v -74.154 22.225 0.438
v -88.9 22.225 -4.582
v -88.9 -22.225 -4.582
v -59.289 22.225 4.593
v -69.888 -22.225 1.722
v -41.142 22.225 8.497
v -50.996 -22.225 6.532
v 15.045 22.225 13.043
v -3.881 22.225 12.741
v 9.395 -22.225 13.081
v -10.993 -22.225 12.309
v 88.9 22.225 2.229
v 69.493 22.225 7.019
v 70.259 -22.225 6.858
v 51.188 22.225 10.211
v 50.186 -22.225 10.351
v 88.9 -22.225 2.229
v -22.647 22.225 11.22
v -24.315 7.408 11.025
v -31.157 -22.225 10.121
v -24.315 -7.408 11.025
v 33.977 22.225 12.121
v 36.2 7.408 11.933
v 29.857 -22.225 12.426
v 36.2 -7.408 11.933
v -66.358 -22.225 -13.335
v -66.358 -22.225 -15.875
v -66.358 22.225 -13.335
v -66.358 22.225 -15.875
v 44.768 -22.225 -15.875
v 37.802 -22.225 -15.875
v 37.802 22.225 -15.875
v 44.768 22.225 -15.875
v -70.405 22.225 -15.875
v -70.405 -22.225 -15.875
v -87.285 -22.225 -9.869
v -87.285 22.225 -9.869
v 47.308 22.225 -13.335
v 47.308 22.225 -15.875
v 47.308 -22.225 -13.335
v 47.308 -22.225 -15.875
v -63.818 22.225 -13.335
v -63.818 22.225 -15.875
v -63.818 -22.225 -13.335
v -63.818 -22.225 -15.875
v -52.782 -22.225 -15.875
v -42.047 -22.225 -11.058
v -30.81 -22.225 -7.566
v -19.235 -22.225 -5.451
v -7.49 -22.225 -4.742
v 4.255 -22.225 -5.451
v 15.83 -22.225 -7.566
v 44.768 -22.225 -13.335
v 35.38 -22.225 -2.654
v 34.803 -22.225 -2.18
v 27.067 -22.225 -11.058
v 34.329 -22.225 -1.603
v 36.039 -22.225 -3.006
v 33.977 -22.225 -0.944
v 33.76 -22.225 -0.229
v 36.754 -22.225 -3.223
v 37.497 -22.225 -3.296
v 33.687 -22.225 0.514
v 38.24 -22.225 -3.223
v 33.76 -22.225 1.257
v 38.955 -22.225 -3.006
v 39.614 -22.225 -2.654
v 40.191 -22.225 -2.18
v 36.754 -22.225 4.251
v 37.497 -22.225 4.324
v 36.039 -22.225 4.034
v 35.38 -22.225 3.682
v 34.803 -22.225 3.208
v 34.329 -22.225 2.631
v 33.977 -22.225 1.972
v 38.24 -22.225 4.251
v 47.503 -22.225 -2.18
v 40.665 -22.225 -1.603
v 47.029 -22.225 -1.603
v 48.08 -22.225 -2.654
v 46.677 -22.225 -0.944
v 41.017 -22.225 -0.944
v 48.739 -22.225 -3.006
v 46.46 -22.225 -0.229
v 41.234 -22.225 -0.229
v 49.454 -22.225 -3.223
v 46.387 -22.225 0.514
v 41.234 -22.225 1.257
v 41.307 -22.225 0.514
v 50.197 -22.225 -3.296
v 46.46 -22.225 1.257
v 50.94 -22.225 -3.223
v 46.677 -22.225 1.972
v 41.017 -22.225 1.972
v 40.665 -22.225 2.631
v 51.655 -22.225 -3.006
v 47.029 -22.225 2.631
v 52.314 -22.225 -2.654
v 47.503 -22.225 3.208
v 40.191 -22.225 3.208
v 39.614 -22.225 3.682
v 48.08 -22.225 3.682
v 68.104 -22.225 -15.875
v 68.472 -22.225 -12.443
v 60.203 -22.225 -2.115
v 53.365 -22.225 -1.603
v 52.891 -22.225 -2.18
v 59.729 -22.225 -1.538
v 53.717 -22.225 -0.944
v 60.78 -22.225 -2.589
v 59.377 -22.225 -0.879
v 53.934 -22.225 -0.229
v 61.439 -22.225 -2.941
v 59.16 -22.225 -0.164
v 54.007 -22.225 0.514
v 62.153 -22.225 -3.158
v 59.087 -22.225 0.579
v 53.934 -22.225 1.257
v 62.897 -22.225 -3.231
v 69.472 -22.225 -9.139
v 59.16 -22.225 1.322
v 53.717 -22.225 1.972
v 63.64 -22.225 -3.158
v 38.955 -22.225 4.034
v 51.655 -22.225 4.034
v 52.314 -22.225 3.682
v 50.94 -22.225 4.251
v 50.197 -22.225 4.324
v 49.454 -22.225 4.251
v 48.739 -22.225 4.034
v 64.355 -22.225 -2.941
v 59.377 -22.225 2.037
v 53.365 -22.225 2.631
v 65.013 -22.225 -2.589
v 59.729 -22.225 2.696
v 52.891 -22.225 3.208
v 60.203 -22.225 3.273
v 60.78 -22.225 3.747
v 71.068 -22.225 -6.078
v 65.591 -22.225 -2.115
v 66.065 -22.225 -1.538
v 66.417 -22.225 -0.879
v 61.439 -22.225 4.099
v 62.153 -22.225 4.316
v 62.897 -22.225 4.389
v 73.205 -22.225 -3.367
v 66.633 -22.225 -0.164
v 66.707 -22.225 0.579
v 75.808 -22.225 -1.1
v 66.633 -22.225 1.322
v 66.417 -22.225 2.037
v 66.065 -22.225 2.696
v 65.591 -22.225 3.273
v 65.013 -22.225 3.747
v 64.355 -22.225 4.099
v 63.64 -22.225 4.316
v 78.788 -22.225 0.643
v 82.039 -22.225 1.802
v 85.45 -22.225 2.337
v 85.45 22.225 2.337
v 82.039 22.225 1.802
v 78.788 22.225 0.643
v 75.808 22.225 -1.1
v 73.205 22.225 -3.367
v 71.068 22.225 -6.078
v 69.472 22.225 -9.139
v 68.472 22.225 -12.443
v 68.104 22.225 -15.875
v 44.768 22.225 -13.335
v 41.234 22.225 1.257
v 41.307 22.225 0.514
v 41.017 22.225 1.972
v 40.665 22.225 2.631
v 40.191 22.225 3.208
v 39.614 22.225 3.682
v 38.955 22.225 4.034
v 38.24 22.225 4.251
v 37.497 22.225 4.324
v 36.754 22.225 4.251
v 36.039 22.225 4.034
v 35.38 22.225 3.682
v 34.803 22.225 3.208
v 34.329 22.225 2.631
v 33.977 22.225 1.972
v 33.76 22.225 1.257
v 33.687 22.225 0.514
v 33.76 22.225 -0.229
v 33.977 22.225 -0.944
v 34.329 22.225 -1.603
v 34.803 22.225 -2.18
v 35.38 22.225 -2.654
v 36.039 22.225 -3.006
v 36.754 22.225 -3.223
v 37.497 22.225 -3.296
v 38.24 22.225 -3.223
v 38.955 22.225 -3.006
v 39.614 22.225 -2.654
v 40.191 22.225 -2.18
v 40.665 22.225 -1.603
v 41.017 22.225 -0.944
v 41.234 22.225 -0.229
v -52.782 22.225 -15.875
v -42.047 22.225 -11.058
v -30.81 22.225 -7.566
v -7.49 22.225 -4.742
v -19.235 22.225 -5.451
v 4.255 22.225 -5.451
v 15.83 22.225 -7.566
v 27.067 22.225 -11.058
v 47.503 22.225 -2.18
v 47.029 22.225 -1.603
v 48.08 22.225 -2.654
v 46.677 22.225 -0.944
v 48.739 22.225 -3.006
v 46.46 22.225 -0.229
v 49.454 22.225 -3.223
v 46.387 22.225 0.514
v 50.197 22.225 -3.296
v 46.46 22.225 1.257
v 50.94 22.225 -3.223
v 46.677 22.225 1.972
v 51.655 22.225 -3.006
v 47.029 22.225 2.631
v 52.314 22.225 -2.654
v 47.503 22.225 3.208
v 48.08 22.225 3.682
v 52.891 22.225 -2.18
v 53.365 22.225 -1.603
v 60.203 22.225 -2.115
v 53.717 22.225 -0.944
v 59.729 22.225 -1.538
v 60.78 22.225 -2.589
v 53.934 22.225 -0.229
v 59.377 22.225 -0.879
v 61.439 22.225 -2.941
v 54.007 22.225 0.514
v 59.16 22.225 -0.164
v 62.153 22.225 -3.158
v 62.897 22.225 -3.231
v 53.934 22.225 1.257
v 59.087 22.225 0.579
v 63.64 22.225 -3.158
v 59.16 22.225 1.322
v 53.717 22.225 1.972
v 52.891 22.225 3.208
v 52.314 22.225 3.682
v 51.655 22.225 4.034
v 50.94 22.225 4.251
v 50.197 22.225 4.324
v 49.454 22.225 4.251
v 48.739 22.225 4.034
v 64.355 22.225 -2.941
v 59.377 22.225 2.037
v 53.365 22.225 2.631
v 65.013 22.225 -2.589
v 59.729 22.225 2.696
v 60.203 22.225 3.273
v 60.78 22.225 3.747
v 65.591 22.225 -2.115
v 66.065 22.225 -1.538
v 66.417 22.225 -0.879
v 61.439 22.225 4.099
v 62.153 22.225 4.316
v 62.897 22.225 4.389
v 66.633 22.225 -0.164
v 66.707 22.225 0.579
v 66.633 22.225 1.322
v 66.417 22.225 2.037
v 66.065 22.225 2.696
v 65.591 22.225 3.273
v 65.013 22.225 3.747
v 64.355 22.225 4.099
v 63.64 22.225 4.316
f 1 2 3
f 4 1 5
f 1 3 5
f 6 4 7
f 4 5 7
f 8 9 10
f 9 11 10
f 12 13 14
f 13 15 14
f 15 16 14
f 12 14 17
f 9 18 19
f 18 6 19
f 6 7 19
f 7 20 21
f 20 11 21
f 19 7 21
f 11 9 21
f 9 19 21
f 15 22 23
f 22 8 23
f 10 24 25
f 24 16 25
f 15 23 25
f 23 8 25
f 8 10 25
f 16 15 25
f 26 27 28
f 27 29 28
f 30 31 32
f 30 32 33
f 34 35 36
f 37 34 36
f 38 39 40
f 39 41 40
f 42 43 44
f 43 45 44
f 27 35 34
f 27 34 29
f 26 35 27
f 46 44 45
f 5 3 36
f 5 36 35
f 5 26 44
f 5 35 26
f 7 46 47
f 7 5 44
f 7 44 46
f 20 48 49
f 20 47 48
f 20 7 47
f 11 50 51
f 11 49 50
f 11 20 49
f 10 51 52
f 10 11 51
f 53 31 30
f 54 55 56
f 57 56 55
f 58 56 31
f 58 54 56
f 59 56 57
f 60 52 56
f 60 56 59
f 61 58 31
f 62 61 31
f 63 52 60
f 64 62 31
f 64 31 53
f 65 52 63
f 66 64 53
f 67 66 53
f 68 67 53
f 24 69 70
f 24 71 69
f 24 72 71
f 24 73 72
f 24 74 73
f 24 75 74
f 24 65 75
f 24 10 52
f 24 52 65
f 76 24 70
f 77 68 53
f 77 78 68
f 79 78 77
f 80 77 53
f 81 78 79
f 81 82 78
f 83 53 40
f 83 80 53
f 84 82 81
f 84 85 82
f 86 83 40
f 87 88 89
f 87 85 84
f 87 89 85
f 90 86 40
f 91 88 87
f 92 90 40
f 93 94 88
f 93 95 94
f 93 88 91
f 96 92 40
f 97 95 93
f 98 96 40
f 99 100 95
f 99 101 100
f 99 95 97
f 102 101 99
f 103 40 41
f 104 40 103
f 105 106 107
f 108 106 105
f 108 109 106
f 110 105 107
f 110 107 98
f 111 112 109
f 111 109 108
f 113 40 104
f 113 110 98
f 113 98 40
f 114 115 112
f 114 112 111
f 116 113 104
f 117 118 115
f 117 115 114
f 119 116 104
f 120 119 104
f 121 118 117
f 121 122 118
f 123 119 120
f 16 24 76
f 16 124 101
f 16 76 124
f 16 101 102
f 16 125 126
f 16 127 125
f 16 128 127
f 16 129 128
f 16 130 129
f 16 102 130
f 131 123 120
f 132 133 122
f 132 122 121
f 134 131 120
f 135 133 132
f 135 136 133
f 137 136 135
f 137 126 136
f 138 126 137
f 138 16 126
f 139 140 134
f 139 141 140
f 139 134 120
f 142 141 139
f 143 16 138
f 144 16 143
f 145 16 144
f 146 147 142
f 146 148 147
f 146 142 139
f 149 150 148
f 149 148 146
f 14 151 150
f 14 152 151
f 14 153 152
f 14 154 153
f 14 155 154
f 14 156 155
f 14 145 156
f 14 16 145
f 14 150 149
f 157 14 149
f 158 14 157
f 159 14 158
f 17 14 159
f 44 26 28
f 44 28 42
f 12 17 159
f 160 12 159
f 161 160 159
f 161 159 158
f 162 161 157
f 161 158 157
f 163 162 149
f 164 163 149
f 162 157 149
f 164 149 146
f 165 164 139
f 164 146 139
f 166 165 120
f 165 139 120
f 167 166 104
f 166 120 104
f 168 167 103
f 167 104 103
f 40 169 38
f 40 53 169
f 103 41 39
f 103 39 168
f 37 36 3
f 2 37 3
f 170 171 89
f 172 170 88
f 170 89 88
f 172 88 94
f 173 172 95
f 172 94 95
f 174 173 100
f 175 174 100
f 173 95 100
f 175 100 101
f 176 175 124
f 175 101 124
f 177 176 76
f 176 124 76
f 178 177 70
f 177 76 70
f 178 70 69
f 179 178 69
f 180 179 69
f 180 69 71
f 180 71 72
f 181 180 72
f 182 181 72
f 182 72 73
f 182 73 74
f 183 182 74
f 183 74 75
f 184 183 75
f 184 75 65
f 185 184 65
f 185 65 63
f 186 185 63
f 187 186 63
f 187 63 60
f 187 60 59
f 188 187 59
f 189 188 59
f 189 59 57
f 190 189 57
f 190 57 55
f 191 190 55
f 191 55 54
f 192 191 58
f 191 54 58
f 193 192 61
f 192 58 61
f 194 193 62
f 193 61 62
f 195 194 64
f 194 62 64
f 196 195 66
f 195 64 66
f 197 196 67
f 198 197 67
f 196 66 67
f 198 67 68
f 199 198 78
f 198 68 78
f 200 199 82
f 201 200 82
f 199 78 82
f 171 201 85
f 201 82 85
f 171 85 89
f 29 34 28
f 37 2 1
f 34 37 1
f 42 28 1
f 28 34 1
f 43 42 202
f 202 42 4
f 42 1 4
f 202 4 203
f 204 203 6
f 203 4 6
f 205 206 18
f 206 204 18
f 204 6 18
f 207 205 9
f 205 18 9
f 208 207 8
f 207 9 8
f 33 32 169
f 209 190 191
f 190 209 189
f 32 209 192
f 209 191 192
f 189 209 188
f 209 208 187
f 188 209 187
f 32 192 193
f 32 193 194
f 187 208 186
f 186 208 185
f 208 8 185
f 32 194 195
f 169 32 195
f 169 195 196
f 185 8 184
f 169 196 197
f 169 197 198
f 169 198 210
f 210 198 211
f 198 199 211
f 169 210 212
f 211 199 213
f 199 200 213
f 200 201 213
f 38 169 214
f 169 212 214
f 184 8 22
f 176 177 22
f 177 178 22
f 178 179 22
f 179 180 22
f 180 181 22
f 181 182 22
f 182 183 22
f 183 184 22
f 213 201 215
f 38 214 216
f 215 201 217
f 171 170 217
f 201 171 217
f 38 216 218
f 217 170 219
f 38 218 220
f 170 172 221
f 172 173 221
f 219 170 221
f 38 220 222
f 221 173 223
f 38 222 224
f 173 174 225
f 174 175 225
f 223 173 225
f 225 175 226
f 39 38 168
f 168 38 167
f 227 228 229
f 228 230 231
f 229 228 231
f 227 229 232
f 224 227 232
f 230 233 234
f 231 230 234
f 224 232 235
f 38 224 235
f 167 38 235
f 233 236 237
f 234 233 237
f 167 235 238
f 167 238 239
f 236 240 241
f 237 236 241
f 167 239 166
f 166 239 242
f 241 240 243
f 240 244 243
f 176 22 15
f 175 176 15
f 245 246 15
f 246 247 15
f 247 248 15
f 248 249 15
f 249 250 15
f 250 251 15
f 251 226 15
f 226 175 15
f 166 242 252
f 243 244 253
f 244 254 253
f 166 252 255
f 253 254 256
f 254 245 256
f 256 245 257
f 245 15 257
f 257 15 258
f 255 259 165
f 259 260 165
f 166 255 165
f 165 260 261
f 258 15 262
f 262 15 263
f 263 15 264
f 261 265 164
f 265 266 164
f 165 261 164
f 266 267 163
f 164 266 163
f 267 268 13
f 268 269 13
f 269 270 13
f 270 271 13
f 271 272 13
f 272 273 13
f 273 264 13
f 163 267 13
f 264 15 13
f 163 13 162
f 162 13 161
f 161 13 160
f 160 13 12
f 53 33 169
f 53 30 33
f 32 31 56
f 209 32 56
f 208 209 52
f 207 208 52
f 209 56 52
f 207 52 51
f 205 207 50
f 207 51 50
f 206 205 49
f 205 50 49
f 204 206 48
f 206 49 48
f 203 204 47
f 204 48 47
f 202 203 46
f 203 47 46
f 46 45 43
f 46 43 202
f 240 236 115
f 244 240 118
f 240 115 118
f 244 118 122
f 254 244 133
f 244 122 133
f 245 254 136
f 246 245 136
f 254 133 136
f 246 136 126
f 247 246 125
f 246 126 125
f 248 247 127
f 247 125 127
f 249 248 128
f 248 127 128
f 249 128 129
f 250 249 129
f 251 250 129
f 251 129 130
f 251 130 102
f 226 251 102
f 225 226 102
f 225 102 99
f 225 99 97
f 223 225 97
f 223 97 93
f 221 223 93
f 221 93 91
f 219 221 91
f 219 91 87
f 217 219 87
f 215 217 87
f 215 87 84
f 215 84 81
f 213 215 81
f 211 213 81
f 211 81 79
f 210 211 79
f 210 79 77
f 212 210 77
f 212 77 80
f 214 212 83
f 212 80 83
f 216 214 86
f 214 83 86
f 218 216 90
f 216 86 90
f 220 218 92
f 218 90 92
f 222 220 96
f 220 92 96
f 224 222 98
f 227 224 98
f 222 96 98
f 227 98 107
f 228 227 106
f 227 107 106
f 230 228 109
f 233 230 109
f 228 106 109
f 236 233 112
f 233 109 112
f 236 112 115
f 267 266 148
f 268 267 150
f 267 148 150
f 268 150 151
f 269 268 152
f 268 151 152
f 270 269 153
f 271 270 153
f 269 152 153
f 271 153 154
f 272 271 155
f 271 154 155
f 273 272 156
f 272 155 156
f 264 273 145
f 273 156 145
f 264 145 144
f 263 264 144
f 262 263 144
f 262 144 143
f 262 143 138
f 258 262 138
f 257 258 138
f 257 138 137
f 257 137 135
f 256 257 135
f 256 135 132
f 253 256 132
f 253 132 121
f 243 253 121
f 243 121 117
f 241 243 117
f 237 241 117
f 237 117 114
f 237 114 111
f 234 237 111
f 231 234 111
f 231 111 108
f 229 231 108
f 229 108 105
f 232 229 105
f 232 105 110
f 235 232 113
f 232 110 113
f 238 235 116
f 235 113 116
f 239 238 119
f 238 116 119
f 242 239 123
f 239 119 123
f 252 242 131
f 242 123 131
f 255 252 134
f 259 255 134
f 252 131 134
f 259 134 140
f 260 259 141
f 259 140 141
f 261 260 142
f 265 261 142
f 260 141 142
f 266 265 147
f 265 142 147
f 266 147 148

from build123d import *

# Parameters (mm, degrees)
F0_W          = 177.8
F0_H          = 31.75
F5_DEPTH      = 22.225
F1_W          = 2.54
F1_H          = 2.54
F2_DEPTH      = 22.225
F2_DEPTH_BACK = 22.225
F3_R          = 3.81
F4_DEPTH      = 101.6


with BuildPart() as f5:
    # F0 (on Front) → F5 (new body, symmetric)
    with BuildSketch(Plane.XZ):
        Rectangle(F0_W, F0_H)
    extrude(amount=F5_DEPTH, both=True)

    # F1 (on Front) → F2 (cut, two sides)
    with BuildSketch(Plane.XZ) as f2_sk:
        with Locations((-65.0875, -14.605)):
            Rectangle(F1_W, F1_H)
        with Locations((46.0375, -14.605)):
            Rectangle(F1_W, F1_H)
    extrude(amount=F2_DEPTH, mode=Mode.SUBTRACT)
    extrude(f2_sk.sketch, amount=-F2_DEPTH_BACK, mode=Mode.SUBTRACT)

    # F3 (on face) → F4 (cut)
    with BuildSketch(Plane.XZ.offset(22.225)):
        with BuildLine():
            Line((-87.2850343585, -9.8690753803), (-88.9, -4.5820707456))
            add(Edge.make_bspline(
                [(-88.9, -4.5820707456), (-23.5271696001, 19.7381507605), (41.3550932653, 15.875), (88.9, 2.2290744901)],
                knots=[0, 0, 0, 0, 177.9304125197, 177.9304125197, 177.9304125197, 177.9304125197], degree=3))
            ThreePointArc((88.9, 2.2290744901), (74.4536678544, -2.1727649281), (68.10375, -15.875))
            Line((68.10375, -15.875), (90.8870175481, -24.3202205747))
            Line((90.8870175481, -24.3202205747), (97.0551893115, -13.2175106555))
            Line((97.0551893115, -13.2175106555), (95.2541902661, 10.2215418592))
            Line((95.2541902661, 10.2215418592), (84.6801921725, 31.5457955003))
            Line((84.6801921725, 31.5457955003), (-24.4083367288, 31.5457955003))
            Line((-24.4083367288, 31.5457955003), (-91.2008285522, 31.5457955003))
            Line((-91.2008285522, 31.5457955003), (-99.3075743318, -4.2296038009))
            Line((-99.3075743318, -4.2296038009), (-93.3156237006, -24.4964528829))
            Line((-93.3156237006, -24.4964528829), (-70.4052746296, -15.875))
            Line((-70.4052746296, -15.875), (-87.2850343585, -9.8690753803))
        make_face()
        with Locations((37.4968686472, 0.5141830338)):
            Circle(F3_R)
        with Locations((50.1968686472, 0.5141830338)):
            Circle(F3_R)
        with Locations((62.8967040475, 0.578842176)):
            Circle(F3_R)
        with BuildLine():
            Line((-8.0186231062, -30.1359239966), (37.8020815551, -15.875))
            ThreePointArc((37.8020815551, -15.875), (-7.4899233878, -4.7422597793), (-52.7819283307, -15.875))
            Line((-52.7819283307, -15.875), (-8.0186231062, -30.1359239966))
        make_face()
    extrude(amount=-F4_DEPTH, mode=Mode.SUBTRACT)


solid = f5.part
